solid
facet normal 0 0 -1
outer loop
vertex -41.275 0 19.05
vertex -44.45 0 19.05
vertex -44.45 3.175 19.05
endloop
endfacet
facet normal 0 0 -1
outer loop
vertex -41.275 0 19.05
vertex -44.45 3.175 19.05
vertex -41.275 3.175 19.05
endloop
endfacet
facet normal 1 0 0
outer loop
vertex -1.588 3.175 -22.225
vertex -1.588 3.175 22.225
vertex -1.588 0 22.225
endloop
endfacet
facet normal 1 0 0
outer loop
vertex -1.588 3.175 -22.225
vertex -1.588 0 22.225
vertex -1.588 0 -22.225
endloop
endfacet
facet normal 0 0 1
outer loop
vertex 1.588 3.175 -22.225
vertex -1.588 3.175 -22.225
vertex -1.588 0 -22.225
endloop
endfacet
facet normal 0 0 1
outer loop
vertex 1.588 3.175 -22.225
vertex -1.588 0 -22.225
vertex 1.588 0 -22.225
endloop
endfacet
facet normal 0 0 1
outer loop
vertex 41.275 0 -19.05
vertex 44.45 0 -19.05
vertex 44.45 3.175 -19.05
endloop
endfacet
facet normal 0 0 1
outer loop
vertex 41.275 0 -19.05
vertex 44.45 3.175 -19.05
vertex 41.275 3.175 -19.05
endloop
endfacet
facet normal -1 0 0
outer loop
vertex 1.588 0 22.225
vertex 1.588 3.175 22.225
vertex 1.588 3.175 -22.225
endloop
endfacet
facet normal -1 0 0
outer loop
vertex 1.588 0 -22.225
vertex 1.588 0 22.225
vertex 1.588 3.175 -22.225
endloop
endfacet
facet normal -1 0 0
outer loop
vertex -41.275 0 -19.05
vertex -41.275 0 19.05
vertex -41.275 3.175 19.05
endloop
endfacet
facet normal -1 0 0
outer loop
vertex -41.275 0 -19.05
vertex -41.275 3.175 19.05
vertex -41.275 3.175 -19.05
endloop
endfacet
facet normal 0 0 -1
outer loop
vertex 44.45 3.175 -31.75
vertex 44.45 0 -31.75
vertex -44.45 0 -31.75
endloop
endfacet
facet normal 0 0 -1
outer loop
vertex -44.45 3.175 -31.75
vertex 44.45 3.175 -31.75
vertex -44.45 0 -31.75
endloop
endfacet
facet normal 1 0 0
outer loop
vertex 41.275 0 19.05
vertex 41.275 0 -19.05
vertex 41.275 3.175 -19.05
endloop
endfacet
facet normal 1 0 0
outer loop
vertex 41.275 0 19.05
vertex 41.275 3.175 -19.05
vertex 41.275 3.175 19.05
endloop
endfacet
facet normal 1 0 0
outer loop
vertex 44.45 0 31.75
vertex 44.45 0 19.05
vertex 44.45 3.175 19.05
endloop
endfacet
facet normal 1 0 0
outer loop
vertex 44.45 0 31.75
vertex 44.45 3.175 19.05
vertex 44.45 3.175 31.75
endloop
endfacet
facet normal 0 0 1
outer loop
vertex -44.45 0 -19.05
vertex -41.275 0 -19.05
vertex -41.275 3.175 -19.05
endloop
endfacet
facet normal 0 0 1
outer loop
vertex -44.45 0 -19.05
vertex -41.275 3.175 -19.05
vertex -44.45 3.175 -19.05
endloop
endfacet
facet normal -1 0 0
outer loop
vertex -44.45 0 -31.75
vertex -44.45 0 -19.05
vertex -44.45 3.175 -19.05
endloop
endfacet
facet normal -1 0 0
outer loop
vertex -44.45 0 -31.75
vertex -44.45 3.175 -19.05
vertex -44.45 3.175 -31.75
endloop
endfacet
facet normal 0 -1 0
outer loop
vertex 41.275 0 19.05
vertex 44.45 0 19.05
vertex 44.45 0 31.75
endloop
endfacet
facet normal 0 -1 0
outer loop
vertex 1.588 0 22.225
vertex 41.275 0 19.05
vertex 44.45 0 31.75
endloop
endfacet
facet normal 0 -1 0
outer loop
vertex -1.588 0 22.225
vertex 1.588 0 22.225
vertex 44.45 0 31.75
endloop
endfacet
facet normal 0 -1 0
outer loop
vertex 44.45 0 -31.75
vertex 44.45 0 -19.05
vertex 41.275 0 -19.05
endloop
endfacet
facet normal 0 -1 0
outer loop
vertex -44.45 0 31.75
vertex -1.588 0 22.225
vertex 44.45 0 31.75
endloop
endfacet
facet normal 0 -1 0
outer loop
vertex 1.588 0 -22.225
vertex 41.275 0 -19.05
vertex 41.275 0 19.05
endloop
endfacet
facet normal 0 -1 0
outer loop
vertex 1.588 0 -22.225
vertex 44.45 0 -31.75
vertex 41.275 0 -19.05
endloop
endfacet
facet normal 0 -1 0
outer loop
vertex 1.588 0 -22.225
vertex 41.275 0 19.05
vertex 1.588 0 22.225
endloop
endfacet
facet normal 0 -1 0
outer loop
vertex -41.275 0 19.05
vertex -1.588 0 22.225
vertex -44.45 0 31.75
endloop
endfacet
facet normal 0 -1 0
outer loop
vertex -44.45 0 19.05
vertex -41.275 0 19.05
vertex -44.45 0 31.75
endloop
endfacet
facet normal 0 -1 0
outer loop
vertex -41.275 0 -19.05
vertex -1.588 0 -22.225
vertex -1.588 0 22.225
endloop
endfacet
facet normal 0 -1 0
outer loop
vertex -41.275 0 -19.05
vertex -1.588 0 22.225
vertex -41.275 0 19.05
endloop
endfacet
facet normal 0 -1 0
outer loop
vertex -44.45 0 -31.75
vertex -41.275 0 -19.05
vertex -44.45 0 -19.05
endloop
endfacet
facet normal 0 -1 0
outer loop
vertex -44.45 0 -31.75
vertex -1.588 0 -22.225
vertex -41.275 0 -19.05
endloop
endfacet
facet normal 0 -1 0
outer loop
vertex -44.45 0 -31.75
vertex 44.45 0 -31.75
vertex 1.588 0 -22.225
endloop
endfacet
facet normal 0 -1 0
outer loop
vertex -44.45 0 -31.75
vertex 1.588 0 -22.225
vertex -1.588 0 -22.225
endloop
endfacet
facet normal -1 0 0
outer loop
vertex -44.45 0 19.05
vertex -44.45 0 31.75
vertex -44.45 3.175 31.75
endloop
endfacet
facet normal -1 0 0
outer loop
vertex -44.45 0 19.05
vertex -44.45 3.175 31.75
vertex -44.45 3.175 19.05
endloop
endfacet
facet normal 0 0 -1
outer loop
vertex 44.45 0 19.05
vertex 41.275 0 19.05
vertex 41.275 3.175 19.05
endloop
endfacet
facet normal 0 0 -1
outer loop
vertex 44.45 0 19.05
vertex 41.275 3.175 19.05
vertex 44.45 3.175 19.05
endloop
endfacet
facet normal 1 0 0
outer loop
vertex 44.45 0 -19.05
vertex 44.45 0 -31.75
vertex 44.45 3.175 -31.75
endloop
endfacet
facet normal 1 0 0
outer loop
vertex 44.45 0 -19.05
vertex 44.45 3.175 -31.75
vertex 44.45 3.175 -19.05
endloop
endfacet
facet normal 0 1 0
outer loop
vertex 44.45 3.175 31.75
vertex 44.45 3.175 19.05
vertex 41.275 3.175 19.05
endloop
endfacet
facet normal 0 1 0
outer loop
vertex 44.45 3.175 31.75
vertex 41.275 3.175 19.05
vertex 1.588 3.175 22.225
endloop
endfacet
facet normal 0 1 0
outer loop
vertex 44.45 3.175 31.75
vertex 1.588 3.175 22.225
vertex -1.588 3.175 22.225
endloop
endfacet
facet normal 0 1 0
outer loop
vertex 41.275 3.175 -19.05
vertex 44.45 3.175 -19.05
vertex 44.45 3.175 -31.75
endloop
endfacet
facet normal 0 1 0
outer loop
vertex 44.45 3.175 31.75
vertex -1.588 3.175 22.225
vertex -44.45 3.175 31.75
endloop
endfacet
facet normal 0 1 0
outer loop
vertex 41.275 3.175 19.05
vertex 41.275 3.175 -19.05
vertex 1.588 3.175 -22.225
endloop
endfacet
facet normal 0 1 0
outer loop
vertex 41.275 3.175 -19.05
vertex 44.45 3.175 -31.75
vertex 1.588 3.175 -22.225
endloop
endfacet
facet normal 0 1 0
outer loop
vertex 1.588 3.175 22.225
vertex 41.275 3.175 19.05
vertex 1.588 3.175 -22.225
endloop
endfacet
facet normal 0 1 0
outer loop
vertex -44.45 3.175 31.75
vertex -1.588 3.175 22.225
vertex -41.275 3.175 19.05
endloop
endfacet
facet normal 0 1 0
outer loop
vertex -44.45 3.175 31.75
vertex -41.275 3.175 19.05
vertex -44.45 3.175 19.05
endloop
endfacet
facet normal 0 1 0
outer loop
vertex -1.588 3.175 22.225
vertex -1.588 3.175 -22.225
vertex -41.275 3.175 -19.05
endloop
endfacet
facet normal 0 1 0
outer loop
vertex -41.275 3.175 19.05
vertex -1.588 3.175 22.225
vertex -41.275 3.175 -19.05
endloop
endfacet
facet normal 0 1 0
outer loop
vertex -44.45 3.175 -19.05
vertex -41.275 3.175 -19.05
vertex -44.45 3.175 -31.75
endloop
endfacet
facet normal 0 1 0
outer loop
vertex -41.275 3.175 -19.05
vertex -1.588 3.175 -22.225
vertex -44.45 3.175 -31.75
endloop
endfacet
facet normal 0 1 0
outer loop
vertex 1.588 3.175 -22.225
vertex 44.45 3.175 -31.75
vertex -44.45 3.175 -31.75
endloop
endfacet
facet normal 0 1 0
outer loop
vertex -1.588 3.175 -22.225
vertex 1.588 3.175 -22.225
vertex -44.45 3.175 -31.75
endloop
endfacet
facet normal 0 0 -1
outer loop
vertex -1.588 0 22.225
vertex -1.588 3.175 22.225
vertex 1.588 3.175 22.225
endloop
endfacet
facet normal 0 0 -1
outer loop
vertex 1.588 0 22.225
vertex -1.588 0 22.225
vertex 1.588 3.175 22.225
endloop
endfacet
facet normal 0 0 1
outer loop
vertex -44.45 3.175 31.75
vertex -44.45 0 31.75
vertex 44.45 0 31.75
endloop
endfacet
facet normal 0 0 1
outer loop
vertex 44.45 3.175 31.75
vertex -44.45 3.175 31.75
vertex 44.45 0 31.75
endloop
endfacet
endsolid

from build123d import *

# Parameters (mm, degrees)
BOSS_EXTRUDE1_DEPTH = 3.175
SKETCH2_W           = 3.175
SKETCH2_H           = 44.45
CUT_EXTRUDE1_DEPTH  = 3.175


with BuildPart() as part:
    # Sketch1 → Boss-Extrude1 (new body)
    with BuildSketch(Plane(origin=(0, 0, 0), x_dir=(1, 0, 0), z_dir=(0, 1, 0))):
        Polygon((-41.275, -19.05), (-41.275, 19.05), (-44.45, 19.05), (-44.45, 31.75), (-41.275, 31.75), (41.275, 31.75), (44.45, 31.75), (44.45, 19.05), (41.275, 19.05), (41.275, -19.05), (44.45, -19.05), (44.45, -31.75), (41.275, -31.75), (-41.275, -31.75), (-44.45, -31.75), (-44.45, -19.05), align=None)
    extrude(amount=BOSS_EXTRUDE1_DEPTH)

    # Sketch2 → Cut-Extrude1 (cut)
    with BuildSketch(Plane(origin=(0, 3.175, 0), x_dir=(1, 0, 0), z_dir=(0, 1, 0))):
        Rectangle(SKETCH2_W, SKETCH2_H)
    extrude(amount=-CUT_EXTRUDE1_DEPTH, mode=Mode.SUBTRACT)


solid = part.part
